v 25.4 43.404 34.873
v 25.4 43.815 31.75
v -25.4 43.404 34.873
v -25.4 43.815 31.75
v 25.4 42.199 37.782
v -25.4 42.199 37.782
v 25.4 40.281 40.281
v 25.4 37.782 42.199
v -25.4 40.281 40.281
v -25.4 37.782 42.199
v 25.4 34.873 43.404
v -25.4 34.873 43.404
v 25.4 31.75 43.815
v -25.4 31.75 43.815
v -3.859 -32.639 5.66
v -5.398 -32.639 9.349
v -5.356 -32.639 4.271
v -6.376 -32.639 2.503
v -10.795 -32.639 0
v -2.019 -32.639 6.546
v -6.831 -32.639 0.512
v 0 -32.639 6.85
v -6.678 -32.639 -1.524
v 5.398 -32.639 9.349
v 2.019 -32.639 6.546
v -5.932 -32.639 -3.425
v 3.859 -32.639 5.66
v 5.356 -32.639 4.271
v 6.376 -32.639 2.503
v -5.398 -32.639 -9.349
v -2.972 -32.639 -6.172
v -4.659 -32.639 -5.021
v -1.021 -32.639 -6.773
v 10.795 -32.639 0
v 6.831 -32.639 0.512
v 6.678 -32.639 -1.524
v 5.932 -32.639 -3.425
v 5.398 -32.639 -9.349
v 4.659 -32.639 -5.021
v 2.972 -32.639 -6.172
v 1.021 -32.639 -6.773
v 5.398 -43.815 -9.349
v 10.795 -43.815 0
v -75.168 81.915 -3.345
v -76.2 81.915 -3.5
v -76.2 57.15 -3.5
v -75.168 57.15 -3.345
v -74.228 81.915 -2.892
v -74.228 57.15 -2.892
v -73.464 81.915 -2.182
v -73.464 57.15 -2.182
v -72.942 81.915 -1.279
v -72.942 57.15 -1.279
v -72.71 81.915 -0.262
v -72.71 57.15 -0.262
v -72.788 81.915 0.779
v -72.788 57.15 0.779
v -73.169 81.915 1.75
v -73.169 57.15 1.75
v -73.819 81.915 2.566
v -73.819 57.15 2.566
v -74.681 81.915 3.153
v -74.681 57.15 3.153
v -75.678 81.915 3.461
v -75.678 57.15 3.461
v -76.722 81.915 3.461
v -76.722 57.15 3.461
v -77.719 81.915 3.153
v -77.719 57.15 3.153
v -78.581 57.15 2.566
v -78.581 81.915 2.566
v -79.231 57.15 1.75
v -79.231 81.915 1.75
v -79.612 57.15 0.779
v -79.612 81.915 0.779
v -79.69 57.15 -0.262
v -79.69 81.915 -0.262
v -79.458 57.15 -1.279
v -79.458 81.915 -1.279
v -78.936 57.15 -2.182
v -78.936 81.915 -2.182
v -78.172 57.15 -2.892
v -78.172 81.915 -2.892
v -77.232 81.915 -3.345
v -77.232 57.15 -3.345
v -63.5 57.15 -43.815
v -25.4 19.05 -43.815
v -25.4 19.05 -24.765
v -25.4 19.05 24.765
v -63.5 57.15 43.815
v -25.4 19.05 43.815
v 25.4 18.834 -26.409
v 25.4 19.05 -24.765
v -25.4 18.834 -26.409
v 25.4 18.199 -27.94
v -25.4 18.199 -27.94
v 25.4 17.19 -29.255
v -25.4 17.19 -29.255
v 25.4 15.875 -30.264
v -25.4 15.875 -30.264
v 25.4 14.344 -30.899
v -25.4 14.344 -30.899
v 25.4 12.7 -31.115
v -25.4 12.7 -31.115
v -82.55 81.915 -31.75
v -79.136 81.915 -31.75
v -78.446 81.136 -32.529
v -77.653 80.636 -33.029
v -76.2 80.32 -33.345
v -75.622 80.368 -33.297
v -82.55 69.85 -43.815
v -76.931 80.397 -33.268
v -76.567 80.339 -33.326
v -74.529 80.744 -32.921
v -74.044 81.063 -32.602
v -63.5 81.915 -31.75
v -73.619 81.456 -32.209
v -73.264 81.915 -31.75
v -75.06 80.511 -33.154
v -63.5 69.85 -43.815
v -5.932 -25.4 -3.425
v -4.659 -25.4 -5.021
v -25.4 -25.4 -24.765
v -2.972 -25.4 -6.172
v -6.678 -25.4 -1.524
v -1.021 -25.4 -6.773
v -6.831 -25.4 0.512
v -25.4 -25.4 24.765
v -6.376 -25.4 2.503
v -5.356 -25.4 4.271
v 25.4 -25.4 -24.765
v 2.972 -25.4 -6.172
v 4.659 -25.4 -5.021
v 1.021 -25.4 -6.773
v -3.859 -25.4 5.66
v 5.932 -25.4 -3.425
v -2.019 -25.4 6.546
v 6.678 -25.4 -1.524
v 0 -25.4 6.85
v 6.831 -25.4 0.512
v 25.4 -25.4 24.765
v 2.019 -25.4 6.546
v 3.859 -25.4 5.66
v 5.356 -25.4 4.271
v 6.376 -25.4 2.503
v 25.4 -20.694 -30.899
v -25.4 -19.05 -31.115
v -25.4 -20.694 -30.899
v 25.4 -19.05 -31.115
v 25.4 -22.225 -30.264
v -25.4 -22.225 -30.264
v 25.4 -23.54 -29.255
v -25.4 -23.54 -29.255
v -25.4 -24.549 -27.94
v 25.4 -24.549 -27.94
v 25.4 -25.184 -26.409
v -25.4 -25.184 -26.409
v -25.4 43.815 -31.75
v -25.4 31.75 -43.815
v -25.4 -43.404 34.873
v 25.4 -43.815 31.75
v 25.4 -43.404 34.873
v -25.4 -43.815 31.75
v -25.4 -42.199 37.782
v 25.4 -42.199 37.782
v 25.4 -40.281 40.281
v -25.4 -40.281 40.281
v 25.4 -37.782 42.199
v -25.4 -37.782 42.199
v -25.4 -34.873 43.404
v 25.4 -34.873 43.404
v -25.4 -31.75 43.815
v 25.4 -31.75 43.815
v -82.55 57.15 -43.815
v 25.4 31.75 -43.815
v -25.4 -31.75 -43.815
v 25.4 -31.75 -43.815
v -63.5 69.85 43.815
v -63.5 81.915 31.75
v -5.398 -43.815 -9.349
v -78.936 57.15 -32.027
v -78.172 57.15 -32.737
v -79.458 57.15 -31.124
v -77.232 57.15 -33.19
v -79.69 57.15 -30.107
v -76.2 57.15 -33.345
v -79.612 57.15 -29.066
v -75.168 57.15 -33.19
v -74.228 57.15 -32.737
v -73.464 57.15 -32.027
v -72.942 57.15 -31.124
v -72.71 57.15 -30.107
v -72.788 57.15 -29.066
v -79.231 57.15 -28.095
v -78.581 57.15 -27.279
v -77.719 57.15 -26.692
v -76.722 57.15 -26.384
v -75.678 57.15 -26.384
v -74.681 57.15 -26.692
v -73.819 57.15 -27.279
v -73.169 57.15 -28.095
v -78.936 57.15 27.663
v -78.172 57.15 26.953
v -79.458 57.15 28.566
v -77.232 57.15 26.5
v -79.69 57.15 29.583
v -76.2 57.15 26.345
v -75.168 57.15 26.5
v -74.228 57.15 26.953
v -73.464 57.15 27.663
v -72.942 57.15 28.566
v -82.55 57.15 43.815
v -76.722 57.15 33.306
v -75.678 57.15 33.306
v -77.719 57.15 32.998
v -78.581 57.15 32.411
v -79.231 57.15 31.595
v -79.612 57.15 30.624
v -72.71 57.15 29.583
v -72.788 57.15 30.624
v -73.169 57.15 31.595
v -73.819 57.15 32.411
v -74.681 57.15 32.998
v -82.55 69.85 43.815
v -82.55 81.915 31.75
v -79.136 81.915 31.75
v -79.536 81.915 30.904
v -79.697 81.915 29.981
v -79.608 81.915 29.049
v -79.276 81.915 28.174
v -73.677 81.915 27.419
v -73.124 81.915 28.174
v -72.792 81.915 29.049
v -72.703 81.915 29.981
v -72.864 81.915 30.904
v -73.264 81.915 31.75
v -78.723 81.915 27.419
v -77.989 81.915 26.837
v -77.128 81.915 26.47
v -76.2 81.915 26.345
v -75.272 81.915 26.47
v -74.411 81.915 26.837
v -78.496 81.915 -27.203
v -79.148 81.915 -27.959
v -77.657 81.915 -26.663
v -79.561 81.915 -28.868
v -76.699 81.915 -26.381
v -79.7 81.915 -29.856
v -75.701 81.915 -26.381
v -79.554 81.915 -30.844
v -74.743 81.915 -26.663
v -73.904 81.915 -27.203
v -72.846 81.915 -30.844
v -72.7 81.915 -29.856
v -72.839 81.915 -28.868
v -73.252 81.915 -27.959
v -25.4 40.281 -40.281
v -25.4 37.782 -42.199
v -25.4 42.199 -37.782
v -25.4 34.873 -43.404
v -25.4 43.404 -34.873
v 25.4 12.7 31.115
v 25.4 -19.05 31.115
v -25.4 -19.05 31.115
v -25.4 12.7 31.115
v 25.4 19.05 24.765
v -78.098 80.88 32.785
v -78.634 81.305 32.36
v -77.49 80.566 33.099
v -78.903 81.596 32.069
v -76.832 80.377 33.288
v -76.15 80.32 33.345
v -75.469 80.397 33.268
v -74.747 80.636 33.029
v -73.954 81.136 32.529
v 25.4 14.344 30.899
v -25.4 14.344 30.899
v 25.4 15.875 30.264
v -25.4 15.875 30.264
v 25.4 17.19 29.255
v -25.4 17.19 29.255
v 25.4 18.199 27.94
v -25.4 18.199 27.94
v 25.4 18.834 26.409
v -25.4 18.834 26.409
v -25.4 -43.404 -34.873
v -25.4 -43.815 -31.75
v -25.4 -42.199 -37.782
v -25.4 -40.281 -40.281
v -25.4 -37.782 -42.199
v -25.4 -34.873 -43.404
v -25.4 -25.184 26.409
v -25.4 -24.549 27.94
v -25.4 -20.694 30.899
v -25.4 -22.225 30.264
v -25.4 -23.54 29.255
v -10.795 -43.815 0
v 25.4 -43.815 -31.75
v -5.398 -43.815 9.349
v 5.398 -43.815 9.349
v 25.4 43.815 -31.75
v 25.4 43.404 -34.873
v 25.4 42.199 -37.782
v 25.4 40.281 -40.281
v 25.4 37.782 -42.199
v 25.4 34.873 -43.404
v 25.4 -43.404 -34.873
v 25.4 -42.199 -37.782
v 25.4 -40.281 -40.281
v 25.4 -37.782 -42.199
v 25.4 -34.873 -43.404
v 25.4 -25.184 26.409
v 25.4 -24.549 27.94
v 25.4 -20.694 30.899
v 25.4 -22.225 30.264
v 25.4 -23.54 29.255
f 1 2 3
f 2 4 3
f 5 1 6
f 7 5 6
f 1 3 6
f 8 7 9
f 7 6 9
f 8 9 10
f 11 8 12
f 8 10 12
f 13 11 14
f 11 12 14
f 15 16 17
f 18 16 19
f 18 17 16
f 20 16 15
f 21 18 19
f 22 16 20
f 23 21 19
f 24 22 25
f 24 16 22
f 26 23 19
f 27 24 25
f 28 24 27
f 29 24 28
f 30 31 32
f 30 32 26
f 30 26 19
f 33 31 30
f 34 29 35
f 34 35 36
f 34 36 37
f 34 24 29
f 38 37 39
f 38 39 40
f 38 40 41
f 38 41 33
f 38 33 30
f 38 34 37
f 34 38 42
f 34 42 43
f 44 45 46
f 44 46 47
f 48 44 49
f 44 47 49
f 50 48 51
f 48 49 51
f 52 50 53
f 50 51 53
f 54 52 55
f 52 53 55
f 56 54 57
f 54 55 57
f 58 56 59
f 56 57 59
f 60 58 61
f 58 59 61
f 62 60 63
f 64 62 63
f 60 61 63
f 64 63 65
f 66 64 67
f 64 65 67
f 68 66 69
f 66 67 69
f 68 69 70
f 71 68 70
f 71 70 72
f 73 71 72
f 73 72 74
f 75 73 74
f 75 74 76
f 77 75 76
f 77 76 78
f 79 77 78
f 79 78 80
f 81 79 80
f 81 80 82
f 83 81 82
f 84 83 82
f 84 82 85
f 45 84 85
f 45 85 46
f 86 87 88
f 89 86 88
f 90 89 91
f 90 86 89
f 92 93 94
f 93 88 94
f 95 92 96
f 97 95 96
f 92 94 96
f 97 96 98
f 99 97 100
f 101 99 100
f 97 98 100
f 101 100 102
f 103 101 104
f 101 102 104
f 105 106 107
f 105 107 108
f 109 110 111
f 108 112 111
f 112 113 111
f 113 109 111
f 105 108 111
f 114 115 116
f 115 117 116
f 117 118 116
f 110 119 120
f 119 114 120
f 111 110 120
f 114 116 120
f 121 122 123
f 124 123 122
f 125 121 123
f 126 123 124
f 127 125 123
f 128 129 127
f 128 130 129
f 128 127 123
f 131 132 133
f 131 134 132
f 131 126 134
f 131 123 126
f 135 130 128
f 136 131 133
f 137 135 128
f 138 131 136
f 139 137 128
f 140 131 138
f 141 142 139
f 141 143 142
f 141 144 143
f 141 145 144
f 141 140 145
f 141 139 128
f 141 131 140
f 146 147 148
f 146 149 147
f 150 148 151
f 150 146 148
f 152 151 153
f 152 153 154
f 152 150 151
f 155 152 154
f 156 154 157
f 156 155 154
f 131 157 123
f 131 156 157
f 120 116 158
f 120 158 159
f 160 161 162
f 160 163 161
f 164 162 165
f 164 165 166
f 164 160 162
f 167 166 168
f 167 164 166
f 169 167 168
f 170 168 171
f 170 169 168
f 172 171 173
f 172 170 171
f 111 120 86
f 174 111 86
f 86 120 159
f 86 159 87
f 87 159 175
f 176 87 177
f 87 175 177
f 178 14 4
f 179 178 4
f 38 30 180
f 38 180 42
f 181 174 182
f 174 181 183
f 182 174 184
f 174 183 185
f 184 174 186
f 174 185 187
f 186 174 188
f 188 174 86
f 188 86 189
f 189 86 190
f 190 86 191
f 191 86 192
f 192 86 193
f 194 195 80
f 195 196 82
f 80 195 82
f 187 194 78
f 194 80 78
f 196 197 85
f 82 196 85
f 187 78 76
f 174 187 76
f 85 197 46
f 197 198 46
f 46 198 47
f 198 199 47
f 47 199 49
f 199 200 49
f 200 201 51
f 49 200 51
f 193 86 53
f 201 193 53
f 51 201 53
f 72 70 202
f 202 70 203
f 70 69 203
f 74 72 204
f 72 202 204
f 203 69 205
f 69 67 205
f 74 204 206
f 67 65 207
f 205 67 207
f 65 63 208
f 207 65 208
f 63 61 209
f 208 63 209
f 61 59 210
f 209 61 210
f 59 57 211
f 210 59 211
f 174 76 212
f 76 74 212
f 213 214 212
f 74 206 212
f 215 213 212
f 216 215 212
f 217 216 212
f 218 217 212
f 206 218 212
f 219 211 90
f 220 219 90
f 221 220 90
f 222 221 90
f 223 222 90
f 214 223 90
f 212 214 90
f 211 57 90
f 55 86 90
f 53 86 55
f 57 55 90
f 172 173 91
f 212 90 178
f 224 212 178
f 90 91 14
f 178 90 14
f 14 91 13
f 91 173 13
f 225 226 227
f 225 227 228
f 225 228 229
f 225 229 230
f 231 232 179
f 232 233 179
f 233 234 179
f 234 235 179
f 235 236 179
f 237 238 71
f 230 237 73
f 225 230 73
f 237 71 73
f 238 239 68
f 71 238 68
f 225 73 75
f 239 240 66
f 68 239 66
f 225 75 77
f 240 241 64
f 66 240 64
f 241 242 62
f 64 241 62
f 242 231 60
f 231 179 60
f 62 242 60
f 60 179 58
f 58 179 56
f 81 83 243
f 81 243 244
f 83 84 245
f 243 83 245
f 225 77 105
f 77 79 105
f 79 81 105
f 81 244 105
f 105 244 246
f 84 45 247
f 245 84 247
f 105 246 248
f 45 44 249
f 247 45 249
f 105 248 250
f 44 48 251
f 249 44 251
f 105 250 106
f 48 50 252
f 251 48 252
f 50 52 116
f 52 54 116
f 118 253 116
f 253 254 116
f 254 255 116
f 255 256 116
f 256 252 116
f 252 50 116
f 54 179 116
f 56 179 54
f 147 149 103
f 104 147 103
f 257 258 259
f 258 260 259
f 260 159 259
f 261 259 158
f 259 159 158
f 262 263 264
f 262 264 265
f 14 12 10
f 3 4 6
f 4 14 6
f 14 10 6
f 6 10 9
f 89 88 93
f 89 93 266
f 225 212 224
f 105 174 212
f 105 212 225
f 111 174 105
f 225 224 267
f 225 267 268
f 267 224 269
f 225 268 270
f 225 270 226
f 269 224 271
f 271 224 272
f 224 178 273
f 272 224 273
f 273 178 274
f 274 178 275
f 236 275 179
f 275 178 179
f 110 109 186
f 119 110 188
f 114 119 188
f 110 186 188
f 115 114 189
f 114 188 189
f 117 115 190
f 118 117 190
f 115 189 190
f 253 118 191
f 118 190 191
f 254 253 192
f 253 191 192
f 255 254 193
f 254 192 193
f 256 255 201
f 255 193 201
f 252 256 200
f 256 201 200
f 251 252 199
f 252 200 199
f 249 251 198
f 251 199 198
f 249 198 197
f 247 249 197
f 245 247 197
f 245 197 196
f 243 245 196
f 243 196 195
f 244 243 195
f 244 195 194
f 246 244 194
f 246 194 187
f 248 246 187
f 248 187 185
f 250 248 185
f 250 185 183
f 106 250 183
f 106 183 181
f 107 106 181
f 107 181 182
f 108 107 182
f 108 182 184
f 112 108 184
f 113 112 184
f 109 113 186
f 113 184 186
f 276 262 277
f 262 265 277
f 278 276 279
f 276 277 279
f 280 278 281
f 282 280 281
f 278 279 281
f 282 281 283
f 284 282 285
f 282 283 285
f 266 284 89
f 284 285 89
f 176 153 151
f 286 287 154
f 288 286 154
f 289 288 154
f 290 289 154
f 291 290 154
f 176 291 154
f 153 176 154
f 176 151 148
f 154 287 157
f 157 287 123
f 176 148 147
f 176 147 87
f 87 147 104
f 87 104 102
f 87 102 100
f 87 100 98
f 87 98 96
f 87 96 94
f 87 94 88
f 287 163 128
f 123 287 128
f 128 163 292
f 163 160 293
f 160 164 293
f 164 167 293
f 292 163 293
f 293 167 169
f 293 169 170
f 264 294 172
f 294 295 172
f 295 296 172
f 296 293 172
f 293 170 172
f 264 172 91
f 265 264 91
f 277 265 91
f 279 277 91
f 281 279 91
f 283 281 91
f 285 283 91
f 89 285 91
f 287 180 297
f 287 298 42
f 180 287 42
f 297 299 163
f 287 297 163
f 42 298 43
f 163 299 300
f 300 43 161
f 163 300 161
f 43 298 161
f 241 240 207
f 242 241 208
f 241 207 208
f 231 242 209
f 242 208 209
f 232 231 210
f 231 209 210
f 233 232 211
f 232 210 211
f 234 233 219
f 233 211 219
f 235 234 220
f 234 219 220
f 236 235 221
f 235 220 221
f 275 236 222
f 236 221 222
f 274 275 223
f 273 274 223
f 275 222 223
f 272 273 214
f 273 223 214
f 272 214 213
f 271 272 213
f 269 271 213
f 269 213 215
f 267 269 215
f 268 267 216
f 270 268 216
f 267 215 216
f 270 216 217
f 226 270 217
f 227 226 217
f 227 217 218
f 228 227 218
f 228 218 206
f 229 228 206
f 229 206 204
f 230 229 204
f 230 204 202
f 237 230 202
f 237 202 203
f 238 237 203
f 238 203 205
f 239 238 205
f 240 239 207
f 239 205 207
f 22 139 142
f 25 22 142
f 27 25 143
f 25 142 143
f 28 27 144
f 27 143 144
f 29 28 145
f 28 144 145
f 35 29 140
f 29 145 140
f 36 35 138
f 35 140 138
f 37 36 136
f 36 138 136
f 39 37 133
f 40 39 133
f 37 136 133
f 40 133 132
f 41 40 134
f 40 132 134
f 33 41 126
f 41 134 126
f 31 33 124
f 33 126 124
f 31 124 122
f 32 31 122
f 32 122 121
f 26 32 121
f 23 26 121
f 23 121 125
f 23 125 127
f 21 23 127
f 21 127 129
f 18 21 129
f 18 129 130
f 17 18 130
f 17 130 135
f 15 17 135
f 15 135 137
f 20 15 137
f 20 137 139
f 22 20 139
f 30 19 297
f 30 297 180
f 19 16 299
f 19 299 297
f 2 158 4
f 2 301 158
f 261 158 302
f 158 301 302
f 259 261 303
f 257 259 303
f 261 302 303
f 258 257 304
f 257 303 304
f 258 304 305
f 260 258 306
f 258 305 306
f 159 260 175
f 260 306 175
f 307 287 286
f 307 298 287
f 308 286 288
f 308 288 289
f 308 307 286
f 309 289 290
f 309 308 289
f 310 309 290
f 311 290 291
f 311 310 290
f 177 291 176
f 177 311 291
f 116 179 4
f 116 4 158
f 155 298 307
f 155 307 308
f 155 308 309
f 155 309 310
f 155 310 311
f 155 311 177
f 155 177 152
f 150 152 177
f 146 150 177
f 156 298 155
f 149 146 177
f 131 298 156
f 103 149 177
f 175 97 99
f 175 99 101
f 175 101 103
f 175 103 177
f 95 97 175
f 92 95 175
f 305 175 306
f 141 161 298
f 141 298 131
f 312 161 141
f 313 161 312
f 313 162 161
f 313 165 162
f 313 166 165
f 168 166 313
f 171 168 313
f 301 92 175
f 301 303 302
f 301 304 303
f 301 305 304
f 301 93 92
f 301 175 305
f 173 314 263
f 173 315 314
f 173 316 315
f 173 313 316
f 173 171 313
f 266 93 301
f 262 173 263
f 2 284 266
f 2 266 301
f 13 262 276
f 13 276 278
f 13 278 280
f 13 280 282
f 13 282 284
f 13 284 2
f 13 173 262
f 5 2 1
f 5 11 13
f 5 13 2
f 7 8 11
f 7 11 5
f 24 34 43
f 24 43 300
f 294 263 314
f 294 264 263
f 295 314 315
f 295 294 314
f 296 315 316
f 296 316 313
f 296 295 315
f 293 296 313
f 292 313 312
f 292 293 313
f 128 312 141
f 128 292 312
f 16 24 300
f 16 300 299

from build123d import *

# Parameters (mm, degrees)
SKETCH002_W          = 87.63
SKETCH002_H          = 87.63
PAD001_DEPTH         = 25.4
FILLET002_R          = 12.065
SKETCH003_W          = 44.45
SKETCH003_H          = 62.23
POCKET001_DEPTH      = 25.401
POCKET001_DEPTH_BACK = 25.401
FILLET003_R          = 6.35
SKETCH004_R          = 6.85
POCKET002_DEPTH      = 18.416
POCKET003_DEPTH      = 11.176
PAD002_DEPTH         = 19.05
SKETCH008_R          = 3.5
POCKET004_DEPTH      = 24.766


with BuildPart() as part:
    # Sketch002 → Pad001 (new body, symmetric)
    with BuildSketch(Plane.YZ):
        Rectangle(SKETCH002_W, SKETCH002_H)
    extrude(amount=PAD001_DEPTH, both=True)

    # Fillet002
    fillet002_edges = [part.edges().sort_by_distance(p)[0] for p in [
        (0, -43.815, 43.815),
        (0, -43.815, -43.815),
        (0, 43.815, -43.815),
        (0, 43.815, 43.815),
    ]]
    fillet(fillet002_edges, radius=FILLET002_R)

    # Sketch003 → Pocket001 (cut, two sides)
    with BuildSketch(Plane.YZ) as pocket001_sk:
        with Locations((-3.175, 0)):
            Rectangle(SKETCH003_W, SKETCH003_H)
    extrude(amount=POCKET001_DEPTH, mode=Mode.SUBTRACT)
    extrude(pocket001_sk.sketch, amount=-POCKET001_DEPTH_BACK, mode=Mode.SUBTRACT)

    # Fillet003
    fillet003_edges = [part.edges().sort_by_distance(p)[0] for p in [
        (0, -25.4, -31.115),
        (0, 19.05, -31.115),
        (0, 19.05, 31.115),
        (0, -25.4, 31.115),
    ]]
    fillet(fillet003_edges, radius=FILLET003_R)

    # Sketch004 (on Face9 of Fillet003) → Pocket002 (cut, through all)
    with BuildSketch(Plane.ZX.offset(-25.4)):
        Circle(SKETCH004_R)
    extrude(amount=-POCKET002_DEPTH, mode=Mode.SUBTRACT)

    # Sketch005 (on Face13 of Pocket002) → Pocket003 (cut)
    with BuildSketch(Plane(origin=(0, -43.815, 0), x_dir=(0, 0, -1), z_dir=(0, -1, 0))):
        Polygon((9.348744, -5.3975), (9.348744, 5.3975), (0, 10.795), (-9.348744, 5.3975), (-9.348744, -5.3975), (0, -10.795), align=None)
    extrude(amount=-POCKET003_DEPTH, mode=Mode.SUBTRACT)

    # AdditivePipe: sweep along a path in Sketch007
    with BuildLine(Plane(origin=(0, 0, 43.815), x_dir=(0, -1, 0), z_dir=(0, 0, 1))) as additivepipe_path:
        Line((-31.75, -25.4), (-69.85, -63.5))
    # Sketch006 (on Face1 of Pocket003) → AdditivePipe (sweep)
    with BuildSketch(Plane(origin=(-25.4, 0, 0), x_dir=(0, 1, 0), z_dir=(-1, 0, 0))):
        Polygon((19.05, 43.815), (31.75, 43.815), (43.815, 31.75), (43.815, -31.75), (31.75, -43.815), (19.05, -43.815), (19.05, 24.765), align=None)
    sweep(path=additivepipe_path.line)

    # AdditivePipe Face20 → Pad002 (new)
    with BuildSketch(Plane(origin=(-63.5, 68.931373, 0), x_dir=(0, 1, 0), z_dir=(-1, 0, 0))):
        Polygon((-11.781373, -43.815), (0.918627, -43.815), (12.983627, -31.75), (12.983627, 31.75), (0.918627, 43.815), (-11.781373, 43.815), (-11.781373, 24.765), align=None)
    extrude(amount=PAD002_DEPTH)

    # Sketch008 (on Face20 of Pad002) → Pocket004 (cut, through all)
    with BuildSketch(Plane(origin=(0, 57.15, 0), x_dir=(0, 0, -1), z_dir=(0, -1, 0))):
        with Locations((-29.845, -76.2)):
            Circle(SKETCH008_R)
        with Locations((0, -76.2)):
            Circle(SKETCH008_R)
        with Locations((29.845, -76.2)):
            Circle(SKETCH008_R)
    extrude(amount=-POCKET004_DEPTH, mode=Mode.SUBTRACT)


solid = part.part
